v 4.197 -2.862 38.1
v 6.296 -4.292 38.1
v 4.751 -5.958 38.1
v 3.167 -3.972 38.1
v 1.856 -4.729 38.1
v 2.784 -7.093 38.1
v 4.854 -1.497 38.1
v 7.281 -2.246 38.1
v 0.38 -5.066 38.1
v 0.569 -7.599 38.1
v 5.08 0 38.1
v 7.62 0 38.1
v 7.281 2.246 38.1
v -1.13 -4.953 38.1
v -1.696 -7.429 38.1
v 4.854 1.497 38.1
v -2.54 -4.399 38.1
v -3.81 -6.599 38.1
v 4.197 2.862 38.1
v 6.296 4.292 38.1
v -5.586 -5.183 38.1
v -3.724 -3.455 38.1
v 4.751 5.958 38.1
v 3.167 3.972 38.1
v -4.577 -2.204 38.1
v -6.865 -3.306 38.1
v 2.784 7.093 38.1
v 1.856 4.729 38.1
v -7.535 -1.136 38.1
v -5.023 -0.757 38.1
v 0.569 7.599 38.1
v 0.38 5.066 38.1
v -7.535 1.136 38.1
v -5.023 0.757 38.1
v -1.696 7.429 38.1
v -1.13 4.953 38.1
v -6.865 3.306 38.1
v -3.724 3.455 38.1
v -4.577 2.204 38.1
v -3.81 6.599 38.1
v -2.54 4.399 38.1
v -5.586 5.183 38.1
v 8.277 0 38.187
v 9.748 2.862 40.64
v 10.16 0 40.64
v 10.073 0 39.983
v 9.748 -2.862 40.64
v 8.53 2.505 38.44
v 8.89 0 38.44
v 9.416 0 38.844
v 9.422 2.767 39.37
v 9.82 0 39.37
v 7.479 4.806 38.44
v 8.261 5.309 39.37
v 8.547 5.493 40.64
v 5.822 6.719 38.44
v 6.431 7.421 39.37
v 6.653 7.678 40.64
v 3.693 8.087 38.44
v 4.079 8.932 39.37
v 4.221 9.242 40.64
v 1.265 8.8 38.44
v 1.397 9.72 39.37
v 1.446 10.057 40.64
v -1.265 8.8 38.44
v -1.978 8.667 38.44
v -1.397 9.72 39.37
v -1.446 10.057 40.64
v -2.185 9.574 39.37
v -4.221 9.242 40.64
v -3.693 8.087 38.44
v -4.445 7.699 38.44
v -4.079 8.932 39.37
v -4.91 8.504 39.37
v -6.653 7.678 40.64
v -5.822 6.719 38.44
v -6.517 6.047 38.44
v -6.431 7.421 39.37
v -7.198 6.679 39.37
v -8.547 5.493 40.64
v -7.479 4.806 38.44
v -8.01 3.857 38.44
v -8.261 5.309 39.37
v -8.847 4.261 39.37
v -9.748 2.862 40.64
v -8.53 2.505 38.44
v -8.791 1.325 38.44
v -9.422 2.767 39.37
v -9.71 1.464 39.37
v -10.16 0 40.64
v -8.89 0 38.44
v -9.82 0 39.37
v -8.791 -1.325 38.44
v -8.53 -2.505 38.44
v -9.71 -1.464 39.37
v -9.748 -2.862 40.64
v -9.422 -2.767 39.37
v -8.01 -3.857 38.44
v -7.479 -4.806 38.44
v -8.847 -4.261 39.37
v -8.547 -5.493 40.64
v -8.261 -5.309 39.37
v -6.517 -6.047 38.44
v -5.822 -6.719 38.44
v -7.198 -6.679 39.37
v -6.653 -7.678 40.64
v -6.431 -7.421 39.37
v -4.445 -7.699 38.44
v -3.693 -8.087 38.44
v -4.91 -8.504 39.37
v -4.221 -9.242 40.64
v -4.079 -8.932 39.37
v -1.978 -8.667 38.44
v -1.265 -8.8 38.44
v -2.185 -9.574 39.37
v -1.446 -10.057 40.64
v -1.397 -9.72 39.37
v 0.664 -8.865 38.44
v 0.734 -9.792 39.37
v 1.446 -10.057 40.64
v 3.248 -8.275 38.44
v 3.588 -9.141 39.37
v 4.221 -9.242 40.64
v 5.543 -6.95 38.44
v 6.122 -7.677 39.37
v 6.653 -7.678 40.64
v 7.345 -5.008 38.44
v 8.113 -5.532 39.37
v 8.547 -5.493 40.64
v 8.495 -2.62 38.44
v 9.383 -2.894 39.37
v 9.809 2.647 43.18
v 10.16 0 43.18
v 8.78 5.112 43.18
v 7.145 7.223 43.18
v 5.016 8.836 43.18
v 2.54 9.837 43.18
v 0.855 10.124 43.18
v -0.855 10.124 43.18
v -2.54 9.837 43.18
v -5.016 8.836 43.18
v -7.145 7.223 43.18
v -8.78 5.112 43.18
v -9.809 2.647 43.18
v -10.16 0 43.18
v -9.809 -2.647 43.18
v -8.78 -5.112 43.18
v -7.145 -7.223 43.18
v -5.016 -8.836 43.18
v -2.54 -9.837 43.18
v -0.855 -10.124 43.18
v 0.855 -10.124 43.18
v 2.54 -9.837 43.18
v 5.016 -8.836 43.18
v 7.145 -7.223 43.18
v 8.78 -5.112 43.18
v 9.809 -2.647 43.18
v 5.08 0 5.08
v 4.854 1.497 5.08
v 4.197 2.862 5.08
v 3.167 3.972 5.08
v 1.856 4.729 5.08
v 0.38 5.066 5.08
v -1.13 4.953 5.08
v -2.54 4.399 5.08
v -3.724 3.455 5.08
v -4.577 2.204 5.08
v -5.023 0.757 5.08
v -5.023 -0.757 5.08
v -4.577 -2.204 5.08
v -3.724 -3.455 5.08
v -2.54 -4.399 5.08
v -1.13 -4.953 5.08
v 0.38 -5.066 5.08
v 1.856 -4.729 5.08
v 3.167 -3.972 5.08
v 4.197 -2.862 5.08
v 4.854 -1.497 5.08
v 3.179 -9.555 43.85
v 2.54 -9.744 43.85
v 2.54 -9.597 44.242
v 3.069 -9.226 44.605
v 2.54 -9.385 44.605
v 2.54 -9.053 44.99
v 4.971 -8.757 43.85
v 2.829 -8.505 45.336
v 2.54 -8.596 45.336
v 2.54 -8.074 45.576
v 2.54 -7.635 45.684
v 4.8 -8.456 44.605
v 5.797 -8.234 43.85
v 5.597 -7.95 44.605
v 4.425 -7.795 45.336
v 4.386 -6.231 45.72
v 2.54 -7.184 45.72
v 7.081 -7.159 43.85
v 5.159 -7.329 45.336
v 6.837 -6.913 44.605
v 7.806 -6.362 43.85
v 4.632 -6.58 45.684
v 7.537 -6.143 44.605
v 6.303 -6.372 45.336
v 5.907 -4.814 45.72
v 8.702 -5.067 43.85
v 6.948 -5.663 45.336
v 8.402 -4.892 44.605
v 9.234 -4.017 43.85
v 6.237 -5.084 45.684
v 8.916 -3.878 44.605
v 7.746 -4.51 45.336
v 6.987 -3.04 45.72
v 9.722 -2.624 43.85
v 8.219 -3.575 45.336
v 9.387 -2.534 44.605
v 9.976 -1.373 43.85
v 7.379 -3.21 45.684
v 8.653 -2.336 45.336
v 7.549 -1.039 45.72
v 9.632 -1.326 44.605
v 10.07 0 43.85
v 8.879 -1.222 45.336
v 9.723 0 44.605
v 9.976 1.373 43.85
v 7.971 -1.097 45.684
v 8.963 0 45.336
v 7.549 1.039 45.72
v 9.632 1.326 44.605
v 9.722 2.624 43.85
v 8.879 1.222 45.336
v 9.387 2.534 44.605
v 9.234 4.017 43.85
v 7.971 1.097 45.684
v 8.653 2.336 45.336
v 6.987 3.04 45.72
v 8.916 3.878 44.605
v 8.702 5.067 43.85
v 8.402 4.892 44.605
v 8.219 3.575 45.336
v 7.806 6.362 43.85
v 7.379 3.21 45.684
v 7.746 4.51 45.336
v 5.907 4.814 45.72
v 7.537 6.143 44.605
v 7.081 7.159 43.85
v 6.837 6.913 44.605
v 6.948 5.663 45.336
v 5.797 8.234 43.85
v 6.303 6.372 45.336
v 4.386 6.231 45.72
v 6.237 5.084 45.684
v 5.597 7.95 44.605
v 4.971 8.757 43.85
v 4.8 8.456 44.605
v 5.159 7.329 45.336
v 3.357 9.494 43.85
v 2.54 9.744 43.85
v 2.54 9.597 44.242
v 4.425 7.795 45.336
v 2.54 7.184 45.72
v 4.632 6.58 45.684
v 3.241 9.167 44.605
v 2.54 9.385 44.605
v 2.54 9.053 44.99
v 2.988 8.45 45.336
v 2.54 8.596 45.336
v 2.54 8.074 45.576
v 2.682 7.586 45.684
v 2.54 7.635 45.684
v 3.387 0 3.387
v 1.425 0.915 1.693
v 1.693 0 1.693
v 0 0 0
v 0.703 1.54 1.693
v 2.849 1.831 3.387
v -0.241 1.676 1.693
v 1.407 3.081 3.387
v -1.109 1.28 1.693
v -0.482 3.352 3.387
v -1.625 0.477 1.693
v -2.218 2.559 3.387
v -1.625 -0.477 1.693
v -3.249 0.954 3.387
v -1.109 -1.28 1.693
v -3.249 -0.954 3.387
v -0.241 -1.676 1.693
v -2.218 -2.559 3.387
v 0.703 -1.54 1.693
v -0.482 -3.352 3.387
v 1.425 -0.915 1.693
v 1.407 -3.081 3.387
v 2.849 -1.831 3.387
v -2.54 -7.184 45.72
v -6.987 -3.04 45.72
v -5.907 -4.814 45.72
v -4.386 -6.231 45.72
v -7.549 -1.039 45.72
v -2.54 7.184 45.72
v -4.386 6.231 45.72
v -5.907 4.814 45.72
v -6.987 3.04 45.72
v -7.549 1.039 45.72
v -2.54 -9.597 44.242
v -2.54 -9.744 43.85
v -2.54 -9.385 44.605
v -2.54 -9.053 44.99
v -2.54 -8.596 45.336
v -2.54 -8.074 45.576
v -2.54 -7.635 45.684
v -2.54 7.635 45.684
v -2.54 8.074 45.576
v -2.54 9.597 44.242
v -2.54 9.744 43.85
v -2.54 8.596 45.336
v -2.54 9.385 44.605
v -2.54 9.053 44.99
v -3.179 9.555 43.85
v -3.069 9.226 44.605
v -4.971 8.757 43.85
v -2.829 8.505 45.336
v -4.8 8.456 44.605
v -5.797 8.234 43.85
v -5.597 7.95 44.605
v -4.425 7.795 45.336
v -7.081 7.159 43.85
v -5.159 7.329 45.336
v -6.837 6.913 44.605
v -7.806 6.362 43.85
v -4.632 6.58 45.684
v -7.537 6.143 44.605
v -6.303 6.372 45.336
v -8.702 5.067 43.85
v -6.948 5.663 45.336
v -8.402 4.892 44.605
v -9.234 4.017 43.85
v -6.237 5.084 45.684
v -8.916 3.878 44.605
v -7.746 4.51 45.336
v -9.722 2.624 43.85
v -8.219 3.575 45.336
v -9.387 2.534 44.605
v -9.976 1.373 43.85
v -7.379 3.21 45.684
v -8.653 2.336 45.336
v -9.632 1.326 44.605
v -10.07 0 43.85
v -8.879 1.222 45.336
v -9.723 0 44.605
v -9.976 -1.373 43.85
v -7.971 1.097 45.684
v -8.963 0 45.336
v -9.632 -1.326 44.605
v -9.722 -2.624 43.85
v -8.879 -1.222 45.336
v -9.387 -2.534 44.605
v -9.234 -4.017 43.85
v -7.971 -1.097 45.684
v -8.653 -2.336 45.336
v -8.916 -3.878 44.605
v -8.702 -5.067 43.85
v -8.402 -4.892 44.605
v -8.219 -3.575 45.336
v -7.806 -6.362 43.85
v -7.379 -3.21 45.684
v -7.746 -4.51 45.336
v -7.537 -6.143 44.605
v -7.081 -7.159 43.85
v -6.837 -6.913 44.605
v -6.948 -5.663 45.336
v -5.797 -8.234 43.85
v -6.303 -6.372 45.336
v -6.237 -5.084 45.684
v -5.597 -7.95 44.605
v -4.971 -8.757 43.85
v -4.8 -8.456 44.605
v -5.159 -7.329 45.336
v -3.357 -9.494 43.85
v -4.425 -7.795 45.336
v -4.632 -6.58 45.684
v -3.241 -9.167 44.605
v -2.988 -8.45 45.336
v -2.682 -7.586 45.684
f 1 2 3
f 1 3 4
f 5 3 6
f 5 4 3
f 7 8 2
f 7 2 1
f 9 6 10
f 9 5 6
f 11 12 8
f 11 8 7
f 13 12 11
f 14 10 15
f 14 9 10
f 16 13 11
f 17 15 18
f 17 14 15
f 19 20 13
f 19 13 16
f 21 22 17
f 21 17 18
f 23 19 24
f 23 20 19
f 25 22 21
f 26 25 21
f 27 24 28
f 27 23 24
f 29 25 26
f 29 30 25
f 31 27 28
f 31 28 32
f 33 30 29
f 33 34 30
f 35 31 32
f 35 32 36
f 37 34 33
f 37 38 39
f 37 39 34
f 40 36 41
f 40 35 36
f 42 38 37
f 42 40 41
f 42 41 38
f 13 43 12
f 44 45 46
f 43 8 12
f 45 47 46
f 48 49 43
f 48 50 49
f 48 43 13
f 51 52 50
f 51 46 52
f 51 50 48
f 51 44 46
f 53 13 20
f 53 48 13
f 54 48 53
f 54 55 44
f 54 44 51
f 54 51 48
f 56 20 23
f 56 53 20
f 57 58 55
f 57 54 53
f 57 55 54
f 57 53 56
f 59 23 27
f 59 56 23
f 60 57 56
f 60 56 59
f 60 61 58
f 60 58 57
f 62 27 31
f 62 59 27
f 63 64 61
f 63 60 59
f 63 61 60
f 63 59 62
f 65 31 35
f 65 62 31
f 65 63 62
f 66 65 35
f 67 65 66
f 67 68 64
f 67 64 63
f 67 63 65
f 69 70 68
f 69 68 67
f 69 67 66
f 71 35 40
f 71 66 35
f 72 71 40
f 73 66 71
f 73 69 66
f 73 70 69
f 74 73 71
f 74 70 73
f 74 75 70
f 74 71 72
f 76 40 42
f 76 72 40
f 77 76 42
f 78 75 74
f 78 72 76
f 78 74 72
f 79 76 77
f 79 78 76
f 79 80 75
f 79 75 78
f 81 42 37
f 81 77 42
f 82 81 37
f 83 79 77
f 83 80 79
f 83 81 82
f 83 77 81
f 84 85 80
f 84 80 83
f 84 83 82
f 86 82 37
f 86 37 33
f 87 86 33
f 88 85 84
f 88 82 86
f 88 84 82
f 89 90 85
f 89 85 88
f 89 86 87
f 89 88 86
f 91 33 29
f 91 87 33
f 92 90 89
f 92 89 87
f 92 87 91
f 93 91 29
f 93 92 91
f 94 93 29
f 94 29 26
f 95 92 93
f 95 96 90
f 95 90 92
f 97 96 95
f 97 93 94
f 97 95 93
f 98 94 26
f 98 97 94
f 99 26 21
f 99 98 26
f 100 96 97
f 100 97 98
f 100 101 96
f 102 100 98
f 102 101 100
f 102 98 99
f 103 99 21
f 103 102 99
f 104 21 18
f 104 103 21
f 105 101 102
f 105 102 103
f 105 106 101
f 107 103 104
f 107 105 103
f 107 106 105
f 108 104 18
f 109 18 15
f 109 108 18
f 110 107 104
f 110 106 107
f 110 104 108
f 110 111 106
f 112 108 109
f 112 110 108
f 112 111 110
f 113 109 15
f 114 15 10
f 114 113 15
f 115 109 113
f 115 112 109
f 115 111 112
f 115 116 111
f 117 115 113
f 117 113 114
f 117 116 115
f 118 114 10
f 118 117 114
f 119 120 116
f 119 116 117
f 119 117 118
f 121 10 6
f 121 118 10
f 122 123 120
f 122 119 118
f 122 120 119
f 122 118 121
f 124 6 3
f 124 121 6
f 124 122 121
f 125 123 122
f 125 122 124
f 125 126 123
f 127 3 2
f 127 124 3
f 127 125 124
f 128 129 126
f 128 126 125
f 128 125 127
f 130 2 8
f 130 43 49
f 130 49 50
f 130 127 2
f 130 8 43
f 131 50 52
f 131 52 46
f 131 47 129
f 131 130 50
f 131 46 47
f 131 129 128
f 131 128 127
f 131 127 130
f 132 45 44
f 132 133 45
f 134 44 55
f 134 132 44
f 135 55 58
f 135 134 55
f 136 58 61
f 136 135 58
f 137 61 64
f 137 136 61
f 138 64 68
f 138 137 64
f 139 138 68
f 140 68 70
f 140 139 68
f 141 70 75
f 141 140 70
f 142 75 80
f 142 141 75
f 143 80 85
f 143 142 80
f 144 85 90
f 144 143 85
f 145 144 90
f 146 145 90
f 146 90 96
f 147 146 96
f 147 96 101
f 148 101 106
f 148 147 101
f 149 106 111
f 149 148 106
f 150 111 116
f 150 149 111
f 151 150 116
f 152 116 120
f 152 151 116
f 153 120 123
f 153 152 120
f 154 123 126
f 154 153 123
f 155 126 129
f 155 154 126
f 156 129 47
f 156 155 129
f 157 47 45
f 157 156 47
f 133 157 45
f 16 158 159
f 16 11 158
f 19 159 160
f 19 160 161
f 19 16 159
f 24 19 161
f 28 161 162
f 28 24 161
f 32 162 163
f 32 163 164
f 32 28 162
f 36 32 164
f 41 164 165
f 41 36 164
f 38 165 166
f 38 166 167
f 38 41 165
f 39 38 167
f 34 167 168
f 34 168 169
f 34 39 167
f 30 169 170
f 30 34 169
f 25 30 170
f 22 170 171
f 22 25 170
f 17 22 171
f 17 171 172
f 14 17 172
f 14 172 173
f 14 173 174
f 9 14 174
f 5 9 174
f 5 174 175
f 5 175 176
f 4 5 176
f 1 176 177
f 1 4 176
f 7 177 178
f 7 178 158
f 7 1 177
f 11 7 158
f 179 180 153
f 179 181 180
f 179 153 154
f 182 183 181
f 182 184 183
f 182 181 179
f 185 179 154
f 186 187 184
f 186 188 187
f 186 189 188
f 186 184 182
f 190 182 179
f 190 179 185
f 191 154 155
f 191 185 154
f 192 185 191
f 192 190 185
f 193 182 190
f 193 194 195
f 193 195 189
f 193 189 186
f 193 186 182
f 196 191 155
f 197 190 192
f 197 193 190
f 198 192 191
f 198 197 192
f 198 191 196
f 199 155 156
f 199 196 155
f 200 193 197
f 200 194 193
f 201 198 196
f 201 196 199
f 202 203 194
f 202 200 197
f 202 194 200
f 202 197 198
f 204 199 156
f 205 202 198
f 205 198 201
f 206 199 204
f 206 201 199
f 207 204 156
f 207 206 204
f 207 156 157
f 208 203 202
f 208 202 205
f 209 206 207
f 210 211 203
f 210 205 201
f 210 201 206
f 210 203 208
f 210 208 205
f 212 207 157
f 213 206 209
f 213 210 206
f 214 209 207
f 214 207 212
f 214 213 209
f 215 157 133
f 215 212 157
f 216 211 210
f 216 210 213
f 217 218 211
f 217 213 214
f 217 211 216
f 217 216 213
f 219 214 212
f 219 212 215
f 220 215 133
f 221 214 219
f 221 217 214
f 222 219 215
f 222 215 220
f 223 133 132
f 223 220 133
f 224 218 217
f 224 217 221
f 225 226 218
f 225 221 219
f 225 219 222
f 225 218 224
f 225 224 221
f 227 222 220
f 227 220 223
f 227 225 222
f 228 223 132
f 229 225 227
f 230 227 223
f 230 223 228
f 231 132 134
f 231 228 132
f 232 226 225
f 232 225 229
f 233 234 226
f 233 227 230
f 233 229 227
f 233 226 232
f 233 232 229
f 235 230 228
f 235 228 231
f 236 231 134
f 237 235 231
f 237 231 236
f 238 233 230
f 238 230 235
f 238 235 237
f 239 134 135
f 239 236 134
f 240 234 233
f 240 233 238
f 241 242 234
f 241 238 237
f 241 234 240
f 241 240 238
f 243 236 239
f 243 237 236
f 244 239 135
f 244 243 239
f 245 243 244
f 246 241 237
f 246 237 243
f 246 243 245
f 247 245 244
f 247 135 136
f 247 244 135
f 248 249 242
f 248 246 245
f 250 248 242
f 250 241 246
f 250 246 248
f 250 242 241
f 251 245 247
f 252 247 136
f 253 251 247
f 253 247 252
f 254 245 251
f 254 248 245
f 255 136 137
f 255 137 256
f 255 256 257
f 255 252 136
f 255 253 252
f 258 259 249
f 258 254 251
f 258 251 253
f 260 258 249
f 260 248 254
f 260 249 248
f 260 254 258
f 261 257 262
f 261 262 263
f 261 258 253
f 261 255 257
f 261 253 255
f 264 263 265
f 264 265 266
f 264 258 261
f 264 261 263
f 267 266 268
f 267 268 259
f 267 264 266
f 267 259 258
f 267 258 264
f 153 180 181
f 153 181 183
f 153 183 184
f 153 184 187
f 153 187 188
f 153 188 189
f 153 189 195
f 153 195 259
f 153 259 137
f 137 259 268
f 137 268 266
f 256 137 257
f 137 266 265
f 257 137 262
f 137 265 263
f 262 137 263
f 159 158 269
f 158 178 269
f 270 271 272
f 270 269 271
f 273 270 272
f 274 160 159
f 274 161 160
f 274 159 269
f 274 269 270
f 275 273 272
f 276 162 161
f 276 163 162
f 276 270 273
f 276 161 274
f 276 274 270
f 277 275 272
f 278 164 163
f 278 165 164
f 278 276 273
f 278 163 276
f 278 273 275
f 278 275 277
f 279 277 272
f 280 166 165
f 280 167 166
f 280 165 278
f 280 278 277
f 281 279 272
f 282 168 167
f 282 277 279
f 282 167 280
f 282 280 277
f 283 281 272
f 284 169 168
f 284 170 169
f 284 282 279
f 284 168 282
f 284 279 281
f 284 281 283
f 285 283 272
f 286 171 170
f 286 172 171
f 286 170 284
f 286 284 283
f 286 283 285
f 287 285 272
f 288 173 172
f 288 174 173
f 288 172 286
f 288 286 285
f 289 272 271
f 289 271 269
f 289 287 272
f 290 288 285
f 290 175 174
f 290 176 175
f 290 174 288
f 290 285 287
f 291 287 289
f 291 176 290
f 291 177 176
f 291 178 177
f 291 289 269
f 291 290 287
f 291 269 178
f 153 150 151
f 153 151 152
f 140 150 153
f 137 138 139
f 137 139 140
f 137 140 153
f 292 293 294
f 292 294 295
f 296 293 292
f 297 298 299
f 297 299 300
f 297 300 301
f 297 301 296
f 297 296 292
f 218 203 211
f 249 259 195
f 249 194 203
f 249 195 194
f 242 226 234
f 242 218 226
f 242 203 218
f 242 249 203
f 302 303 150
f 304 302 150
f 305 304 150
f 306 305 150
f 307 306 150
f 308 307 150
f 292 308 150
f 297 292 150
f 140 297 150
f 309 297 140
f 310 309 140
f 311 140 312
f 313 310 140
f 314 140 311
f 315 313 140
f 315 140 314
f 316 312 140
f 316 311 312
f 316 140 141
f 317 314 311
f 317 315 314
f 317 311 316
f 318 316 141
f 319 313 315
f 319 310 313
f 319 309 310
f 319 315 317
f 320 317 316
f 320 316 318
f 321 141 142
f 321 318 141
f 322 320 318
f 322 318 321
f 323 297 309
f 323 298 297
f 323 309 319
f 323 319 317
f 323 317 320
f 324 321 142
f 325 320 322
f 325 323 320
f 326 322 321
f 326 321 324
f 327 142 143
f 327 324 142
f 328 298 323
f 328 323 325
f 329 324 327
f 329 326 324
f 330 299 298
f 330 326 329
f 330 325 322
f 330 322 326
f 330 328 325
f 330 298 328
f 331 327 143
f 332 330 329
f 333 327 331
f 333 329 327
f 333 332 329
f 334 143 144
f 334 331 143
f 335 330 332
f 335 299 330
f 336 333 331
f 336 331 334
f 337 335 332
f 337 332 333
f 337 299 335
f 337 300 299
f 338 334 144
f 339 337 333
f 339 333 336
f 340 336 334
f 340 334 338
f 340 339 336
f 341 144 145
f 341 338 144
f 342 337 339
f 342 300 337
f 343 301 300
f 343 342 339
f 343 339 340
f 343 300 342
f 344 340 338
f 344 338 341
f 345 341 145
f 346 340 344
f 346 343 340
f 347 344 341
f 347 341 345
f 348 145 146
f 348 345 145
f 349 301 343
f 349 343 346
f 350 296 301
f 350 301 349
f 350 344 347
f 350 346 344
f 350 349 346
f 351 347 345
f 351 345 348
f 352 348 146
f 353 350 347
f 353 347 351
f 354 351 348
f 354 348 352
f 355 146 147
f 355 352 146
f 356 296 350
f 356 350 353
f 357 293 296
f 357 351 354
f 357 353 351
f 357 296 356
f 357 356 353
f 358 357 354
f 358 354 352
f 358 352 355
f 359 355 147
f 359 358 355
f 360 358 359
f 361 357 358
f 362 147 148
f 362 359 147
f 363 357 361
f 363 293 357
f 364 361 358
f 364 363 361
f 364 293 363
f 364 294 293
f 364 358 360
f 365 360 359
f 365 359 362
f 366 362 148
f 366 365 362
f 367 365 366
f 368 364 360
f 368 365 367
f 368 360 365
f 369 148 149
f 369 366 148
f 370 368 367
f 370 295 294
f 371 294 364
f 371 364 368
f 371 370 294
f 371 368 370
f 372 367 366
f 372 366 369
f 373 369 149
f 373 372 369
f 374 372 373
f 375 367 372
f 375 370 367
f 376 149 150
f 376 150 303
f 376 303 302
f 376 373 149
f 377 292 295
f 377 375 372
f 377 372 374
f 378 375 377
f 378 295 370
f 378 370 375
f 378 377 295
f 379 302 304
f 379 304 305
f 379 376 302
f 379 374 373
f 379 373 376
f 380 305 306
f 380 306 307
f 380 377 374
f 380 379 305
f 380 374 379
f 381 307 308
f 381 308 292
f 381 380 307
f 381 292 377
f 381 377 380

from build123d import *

# Parameters (mm, degrees)
F2_R     = 2.54
F3_W     = 5.08
F3_H     = 22.090304
F4_DEPTH = 2.54


with BuildPart() as f1:
    # F0 (on Front) → F1 (revolve)
    with BuildSketch(Plane.XZ):
        Polygon((0, 45.72), (0, 0), (5.08, 5.08), (5.08, 38.1), (10.16, 38.1), (10.16, 45.72), align=None)
    revolve(axis=Axis((0, 0, 22.86), (0, 0, 1)))

    # F2
    f2_edges = [f1.edges().sort_by_distance(p)[0] for p in [
        (-10.16, 0, 45.72),
        (-10.16, 0, 38.1),
    ]]
    fillet(f2_edges, radius=F2_R)

    # F3 (on face) → F4 (cut)
    with BuildSketch(Plane.XY.offset(45.72)):
        with Locations((0, -0.139493)):
            Rectangle(F3_W, F3_H)
    extrude(amount=-F4_DEPTH, mode=Mode.SUBTRACT)


solid = f1.part
